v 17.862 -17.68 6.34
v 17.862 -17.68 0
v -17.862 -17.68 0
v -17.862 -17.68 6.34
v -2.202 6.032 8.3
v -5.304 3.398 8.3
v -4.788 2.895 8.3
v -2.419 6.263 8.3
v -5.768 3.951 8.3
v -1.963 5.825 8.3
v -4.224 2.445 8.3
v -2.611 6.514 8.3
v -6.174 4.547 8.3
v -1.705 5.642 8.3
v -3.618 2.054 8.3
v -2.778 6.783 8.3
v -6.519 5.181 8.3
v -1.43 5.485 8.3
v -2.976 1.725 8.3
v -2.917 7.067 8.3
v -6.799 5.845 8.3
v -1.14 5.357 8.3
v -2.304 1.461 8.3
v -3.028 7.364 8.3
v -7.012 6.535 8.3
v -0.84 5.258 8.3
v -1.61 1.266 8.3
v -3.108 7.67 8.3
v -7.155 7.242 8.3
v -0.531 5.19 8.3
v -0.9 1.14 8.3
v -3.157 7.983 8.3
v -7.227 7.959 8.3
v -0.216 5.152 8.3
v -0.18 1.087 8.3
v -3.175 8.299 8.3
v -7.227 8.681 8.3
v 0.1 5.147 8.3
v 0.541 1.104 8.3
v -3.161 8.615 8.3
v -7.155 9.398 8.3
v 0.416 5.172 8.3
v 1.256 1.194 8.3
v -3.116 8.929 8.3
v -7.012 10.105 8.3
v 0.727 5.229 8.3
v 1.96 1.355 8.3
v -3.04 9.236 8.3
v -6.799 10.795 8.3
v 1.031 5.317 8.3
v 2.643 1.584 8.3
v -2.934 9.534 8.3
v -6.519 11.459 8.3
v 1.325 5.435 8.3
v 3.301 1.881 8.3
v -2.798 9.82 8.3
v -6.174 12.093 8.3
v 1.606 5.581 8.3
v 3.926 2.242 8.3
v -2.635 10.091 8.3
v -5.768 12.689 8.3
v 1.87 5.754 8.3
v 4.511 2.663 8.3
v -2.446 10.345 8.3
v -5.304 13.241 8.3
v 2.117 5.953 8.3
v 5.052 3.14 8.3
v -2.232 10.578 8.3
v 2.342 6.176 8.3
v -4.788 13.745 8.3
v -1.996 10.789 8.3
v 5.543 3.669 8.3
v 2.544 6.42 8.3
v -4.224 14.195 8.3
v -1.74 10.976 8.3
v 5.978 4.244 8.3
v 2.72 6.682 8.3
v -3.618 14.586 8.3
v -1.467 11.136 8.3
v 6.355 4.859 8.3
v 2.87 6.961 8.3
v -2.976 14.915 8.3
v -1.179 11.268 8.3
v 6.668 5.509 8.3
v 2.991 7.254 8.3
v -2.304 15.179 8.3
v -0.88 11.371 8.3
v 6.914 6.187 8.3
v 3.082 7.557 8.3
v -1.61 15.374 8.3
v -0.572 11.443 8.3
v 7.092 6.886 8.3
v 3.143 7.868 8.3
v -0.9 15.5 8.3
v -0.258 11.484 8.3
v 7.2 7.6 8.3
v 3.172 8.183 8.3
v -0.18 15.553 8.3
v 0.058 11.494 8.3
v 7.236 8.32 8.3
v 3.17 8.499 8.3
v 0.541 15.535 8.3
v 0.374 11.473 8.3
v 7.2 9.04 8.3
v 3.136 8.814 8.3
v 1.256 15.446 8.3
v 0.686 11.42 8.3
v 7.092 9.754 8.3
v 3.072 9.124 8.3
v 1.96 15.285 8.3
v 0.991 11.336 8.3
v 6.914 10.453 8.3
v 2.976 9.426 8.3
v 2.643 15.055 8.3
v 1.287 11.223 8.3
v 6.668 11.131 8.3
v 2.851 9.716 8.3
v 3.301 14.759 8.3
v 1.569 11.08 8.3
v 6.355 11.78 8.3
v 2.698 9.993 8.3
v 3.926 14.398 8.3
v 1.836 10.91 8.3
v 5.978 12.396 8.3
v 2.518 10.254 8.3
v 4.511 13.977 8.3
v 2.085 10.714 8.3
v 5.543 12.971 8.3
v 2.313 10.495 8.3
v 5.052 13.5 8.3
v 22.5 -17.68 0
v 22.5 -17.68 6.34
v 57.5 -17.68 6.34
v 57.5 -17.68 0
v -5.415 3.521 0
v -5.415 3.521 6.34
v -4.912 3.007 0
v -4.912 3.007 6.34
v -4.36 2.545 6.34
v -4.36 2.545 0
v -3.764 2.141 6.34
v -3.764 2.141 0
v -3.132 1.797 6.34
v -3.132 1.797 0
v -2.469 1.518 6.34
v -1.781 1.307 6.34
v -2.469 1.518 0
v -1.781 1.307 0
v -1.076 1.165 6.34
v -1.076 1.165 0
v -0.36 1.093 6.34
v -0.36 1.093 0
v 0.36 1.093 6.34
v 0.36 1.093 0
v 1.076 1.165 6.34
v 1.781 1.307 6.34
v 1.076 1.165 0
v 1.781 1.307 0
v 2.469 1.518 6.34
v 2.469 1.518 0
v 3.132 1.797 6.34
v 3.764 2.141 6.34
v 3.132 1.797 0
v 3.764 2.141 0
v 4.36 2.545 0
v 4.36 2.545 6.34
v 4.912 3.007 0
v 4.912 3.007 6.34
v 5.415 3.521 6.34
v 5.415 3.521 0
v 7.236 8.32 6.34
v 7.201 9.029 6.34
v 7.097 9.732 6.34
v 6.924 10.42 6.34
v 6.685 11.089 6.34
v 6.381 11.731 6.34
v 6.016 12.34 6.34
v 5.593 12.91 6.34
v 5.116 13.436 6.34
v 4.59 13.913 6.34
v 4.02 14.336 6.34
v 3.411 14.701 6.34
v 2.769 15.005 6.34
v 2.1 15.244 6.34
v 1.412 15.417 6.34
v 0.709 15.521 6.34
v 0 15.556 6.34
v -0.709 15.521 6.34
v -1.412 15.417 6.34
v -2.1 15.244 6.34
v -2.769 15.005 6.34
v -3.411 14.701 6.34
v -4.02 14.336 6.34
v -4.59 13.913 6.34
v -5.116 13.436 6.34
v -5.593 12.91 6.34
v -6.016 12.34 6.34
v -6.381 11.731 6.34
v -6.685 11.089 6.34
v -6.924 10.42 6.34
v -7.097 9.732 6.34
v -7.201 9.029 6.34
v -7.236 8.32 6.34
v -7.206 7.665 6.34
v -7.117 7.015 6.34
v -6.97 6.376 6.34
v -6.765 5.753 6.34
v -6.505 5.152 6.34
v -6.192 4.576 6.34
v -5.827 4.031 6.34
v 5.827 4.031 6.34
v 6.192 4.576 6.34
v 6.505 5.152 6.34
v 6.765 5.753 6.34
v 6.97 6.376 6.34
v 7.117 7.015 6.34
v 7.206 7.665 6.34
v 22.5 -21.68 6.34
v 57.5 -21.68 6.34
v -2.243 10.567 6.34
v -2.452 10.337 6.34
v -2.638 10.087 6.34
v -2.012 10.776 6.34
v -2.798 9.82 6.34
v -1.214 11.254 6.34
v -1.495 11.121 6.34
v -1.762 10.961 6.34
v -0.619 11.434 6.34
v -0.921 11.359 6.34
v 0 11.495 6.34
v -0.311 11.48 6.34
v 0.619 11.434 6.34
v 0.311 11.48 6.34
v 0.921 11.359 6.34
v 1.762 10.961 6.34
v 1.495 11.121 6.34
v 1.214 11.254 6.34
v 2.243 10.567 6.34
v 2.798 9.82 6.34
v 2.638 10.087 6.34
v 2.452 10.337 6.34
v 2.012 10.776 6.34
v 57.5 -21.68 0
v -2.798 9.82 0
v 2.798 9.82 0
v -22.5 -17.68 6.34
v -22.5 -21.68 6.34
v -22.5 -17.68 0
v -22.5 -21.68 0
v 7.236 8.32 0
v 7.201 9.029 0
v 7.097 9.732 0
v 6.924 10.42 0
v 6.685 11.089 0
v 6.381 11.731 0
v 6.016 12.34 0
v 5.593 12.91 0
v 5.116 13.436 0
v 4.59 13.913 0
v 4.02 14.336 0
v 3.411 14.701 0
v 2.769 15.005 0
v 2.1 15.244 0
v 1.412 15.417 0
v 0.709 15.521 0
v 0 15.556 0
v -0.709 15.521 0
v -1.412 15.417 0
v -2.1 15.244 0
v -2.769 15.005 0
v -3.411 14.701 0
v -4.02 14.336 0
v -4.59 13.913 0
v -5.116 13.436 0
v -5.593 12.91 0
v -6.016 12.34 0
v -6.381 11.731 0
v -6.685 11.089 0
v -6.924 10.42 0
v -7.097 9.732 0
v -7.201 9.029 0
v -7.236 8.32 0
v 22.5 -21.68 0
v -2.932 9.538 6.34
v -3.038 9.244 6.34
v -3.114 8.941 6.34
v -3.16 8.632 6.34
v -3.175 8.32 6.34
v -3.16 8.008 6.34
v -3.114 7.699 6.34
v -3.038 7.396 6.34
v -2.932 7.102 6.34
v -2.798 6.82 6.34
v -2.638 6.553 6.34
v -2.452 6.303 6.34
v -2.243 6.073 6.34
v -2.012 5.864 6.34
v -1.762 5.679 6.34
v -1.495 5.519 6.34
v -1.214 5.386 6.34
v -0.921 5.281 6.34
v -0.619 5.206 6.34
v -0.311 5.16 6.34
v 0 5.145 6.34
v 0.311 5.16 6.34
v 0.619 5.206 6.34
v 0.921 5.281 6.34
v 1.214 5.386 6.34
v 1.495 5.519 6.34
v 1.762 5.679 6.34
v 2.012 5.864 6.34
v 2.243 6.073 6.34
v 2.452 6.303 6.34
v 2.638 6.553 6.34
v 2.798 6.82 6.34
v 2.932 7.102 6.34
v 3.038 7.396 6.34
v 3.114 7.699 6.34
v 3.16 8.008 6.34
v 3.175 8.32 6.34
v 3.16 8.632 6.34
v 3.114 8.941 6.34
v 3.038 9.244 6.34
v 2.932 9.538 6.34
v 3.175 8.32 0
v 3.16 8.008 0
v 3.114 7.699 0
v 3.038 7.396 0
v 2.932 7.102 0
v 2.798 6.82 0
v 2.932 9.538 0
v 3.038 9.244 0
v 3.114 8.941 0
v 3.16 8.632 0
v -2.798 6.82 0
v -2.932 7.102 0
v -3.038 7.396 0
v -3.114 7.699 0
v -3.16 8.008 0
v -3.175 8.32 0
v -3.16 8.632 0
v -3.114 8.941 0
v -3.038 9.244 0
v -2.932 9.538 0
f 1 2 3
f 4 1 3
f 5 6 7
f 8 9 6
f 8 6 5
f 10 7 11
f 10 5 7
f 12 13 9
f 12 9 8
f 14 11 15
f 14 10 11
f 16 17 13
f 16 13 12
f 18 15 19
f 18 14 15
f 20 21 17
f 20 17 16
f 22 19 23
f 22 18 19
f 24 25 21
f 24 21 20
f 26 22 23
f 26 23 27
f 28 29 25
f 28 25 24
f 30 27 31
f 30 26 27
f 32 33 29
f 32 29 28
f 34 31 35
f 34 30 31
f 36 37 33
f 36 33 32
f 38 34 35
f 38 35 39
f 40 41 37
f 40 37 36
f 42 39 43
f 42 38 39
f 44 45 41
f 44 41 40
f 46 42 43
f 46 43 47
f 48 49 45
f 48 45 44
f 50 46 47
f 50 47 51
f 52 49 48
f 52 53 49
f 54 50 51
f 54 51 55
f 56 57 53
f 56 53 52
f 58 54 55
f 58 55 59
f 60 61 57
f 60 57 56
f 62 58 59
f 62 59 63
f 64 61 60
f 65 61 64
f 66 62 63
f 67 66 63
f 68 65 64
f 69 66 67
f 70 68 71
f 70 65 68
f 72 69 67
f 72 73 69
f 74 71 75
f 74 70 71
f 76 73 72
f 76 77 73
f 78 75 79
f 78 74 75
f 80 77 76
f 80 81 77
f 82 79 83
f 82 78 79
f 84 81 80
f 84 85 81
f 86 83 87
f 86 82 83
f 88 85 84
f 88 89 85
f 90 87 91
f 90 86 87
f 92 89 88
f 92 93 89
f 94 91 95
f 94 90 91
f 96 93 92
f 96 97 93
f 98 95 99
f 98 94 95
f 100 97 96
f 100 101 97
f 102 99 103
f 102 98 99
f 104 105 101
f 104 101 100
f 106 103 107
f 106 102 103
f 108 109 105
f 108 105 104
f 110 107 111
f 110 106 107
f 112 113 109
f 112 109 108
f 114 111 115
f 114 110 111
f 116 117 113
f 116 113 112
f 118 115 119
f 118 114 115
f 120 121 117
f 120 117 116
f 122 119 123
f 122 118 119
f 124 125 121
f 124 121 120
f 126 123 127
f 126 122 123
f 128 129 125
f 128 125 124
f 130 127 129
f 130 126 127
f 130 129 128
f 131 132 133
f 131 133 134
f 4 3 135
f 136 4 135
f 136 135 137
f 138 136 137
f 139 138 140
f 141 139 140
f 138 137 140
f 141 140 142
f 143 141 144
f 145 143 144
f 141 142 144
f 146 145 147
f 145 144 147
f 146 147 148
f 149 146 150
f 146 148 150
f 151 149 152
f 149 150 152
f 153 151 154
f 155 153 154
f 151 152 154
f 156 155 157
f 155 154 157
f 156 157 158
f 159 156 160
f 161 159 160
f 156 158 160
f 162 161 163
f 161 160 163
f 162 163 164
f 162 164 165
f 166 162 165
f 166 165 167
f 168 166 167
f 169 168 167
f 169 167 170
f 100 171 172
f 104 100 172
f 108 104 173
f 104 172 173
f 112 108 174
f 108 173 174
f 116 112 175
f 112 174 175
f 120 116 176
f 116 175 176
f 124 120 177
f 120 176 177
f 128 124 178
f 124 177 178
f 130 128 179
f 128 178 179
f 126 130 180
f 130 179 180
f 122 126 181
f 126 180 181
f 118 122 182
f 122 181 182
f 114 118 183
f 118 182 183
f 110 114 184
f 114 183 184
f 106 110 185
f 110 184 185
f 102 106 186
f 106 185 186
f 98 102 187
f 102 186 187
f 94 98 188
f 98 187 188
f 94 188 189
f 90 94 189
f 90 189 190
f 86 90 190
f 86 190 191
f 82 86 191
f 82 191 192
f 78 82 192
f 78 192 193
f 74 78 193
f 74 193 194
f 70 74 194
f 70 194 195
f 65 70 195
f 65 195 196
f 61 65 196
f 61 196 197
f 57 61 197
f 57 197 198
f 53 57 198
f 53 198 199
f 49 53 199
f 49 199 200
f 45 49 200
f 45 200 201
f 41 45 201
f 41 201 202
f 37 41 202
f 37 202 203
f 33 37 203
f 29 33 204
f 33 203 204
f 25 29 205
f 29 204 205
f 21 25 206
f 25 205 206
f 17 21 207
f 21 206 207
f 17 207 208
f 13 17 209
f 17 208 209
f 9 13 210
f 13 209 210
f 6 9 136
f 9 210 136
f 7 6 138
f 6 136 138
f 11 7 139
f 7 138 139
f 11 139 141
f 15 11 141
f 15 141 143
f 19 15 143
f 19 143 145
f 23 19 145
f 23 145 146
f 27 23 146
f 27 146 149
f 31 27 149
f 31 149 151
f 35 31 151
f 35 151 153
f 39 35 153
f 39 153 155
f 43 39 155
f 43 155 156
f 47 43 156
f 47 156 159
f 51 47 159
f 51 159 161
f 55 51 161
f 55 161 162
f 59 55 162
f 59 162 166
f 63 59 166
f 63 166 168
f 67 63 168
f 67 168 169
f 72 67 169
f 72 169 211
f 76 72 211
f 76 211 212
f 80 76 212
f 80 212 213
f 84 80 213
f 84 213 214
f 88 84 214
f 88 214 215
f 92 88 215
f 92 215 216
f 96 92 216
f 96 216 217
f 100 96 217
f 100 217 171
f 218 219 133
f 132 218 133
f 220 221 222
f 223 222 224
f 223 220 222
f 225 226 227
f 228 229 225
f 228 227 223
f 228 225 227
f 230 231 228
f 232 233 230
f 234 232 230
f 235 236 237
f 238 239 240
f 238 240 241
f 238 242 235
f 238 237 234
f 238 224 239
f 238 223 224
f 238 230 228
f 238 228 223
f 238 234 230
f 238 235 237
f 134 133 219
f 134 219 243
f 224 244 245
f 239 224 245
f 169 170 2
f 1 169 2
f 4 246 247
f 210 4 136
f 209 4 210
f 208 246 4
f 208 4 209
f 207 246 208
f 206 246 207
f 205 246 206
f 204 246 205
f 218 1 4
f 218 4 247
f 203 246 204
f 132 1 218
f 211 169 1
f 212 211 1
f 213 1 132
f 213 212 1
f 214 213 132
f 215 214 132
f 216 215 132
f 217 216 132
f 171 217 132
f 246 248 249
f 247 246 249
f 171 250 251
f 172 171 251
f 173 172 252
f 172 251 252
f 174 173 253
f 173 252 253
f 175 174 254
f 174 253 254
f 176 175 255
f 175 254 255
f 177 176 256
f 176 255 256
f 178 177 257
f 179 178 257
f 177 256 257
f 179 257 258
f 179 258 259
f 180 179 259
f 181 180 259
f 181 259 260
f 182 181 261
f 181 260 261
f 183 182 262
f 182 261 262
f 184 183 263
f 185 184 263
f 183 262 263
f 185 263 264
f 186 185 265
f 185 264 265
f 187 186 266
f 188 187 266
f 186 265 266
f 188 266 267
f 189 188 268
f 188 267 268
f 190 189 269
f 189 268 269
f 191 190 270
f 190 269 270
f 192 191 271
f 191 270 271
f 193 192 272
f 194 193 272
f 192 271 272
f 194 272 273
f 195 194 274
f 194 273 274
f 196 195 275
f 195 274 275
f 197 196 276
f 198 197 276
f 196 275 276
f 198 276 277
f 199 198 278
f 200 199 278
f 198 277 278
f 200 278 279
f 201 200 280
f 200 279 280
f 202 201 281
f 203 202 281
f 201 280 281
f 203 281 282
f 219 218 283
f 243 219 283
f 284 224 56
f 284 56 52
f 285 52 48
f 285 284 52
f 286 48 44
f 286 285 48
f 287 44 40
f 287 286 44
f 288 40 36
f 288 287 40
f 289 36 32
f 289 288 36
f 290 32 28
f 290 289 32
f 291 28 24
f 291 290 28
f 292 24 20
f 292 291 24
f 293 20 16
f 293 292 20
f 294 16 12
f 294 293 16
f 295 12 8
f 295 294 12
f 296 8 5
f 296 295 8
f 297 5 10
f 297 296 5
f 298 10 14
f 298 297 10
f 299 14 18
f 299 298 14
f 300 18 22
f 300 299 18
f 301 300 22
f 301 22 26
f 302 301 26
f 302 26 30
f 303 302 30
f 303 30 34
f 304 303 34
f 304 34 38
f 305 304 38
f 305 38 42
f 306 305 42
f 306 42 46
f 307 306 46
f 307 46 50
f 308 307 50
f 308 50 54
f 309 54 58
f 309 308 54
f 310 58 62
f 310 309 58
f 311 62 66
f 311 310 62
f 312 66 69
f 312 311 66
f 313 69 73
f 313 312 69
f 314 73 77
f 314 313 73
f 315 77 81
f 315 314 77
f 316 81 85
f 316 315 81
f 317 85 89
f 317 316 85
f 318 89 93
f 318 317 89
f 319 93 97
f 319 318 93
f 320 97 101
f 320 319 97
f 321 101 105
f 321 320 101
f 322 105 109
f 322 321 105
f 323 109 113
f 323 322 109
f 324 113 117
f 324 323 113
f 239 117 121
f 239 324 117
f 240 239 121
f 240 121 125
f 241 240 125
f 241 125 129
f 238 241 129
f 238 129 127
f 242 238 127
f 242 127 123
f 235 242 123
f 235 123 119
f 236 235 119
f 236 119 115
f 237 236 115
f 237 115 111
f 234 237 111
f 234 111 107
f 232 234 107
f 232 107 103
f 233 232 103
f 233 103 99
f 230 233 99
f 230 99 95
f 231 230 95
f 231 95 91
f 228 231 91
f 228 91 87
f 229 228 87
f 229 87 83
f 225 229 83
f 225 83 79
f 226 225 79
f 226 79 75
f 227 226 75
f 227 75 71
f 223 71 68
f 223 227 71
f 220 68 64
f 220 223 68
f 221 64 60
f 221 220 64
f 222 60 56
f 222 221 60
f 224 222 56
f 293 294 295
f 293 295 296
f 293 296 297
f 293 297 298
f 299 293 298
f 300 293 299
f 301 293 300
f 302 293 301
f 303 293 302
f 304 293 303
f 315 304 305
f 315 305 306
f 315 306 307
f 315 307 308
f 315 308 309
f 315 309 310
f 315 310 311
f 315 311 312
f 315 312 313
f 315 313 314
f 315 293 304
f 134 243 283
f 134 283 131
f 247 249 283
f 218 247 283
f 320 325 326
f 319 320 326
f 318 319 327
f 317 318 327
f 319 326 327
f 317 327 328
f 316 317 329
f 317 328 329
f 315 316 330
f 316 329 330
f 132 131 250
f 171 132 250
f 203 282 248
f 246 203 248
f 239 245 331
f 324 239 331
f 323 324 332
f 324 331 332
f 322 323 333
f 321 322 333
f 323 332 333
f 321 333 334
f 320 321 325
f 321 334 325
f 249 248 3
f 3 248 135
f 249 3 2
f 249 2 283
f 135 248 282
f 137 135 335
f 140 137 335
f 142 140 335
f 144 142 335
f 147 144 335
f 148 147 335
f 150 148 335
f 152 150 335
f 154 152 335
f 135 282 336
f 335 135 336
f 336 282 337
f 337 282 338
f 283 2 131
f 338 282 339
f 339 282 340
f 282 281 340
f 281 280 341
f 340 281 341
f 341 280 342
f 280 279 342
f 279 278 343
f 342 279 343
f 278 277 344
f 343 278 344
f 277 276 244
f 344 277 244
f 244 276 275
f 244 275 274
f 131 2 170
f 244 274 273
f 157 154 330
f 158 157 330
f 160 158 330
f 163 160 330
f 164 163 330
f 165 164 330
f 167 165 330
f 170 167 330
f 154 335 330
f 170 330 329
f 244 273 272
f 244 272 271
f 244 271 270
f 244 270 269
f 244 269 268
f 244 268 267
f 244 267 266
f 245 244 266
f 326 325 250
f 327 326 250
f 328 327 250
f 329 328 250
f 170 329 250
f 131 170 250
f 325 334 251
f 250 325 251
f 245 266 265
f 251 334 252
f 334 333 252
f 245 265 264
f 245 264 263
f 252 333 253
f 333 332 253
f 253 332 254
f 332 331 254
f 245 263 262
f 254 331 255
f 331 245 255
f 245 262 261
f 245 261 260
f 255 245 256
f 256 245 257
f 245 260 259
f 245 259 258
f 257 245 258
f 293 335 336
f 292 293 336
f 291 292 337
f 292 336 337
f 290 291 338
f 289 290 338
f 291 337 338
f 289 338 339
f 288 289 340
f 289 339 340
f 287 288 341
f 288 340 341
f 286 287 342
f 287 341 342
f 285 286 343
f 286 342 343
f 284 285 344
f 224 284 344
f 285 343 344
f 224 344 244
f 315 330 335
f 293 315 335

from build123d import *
from build123d.topology import SkipClean

# Parameters (mm, degrees)
BOSS_EXTRUDE1_DEPTH = 6.34
SKETCH6_R           = 7.235705293
SKETCH6_R_2         = 3.175
BOSS_EXTRUDE2_DEPTH = 1.96
SKETCH8_W           = 6.34
SKETCH8_H           = 4
BOSS_EXTRUDE4_DEPTH = 35


with BuildPart() as part:
    # Sketch1 → Boss-Extrude1 (new body)
    # profile 1 of 5: a face of its own
    with BuildSketch(Plane.XY):
        with BuildLine():
            ThreePointArc((7.235705293, 8.31996617), (0, 15.555671463), (-7.235705293, 8.31996617))
            ThreePointArc((-7.235705293, 8.31996617), (-6.76521969, 5.753405509), (-5.414947438, 3.520614617))
            Line((-5.414947438, 3.520614617), (-3.113806984, 7.440196422))
            ThreePointArc((-3.113806984, 7.440196422), (0, 11.555671463), (3.113806984, 7.440196422))
            Line((3.113806984, 7.440196422), (5.414947438, 3.520614617))
            ThreePointArc((5.414947438, 3.520614617), (6.76521969, 5.753405509), (7.235705293, 8.31996617))
        make_face()
    # profile 2 of 5: a face of its own
    with BuildSketch(Plane.XY):
        with BuildLine():
            Line((-7.235705293, 8.31996617), (-22.5, -17.68003383))
            Line((-22.5, -17.68003383), (-22.5, -21.68003383))
            Line((-22.5, -21.68003383), (22.5, -21.68003383))
            Line((22.5, -21.68003383), (22.5, -17.68003383))
            Line((22.5, -17.68003383), (7.235705293, 8.31996617))
            ThreePointArc((7.235705293, 8.31996617), (6.76521969, 5.753405509), (5.414947438, 3.520614617))
            Line((5.414947438, 3.520614617), (17.861599202, -17.68003383))
            Line((17.861599202, -17.68003383), (-17.861599202, -17.68003383))
            Line((-17.861599202, -17.68003383), (-5.414947438, 3.520614617))
            ThreePointArc((-5.414947438, 3.520614617), (-6.76521969, 5.753405509), (-7.235705293, 8.31996617))
        make_face()
    # profile 3 of 5: a face of its own
    with BuildSketch(Plane.XY):
        with BuildLine():
            Line((-3.113806984, 7.440196422), (-5.414947438, 3.520614617))
            ThreePointArc((-5.414947438, 3.520614617), (0, 1.084260877), (5.414947438, 3.520614617))
            Line((5.414947438, 3.520614617), (3.113806984, 7.440196422))
            ThreePointArc((3.113806984, 7.440196422), (0, 11.555671463), (-3.113806984, 7.440196422))
        make_face()
        with BuildLine():
            ThreePointArc((-2.798325392, 6.81996617), (-3.175, 8.31996617), (-2.798325392, 9.81996617))
            ThreePointArc((-2.798325392, 9.81996617), (0, 11.49496617), (2.798325392, 9.81996617))
            ThreePointArc((2.798325392, 9.81996617), (3.079391833, 9.093251978), (3.175, 8.31996617))
            ThreePointArc((3.175, 8.31996617), (3.079391833, 7.546680362), (2.798325392, 6.81996617))
            ThreePointArc((2.798325392, 6.81996617), (0, 5.14496617), (-2.798325392, 6.81996617))
        make_face(mode=Mode.SUBTRACT)
    # profile 4 of 5: a face of its own
    with BuildSketch(Plane.XY):
        with BuildLine():
            Line((2.798325392, 6.81996617), (-2.798325392, 6.81996617))
            ThreePointArc((-2.798325392, 6.81996617), (0, 5.14496617), (2.798325392, 6.81996617))
        make_face()
    # profile 5 of 5: a face of its own
    with BuildSketch(Plane.XY):
        with BuildLine():
            ThreePointArc((2.798325392, 9.81996617), (0, 11.49496617), (-2.798325392, 9.81996617))
            Line((-2.798325392, 9.81996617), (2.798325392, 9.81996617))
        make_face()
    extrude(amount=BOSS_EXTRUDE1_DEPTH)

    # Sketch6 → Boss-Extrude2 (add)
    with SkipClean():  # the faces are left unmerged after this step: merging them gives an invalid solid
        with BuildSketch(Plane.XY.offset(6.34)):
            with Locations((0, 8.31996617)):
                Circle(SKETCH6_R)
            with Locations(Location((0, 8.31996617, 0), (0, 0, 151.807139439))):
                Circle(SKETCH6_R_2, mode=Mode.SUBTRACT)
        extrude(amount=BOSS_EXTRUDE2_DEPTH)

    # Sketch8 → Boss-Extrude4 (add)
    with SkipClean():  # the faces are left unmerged after this step: merging them gives an invalid solid
        with BuildSketch(Plane(origin=(22.5, 0, 0), x_dir=(0, 0, -1), z_dir=(1, 0, 0))):
            with Locations((-3.17, -19.68003383)):
                Rectangle(SKETCH8_W, SKETCH8_H)
        extrude(amount=BOSS_EXTRUDE4_DEPTH)


solid = part.part
